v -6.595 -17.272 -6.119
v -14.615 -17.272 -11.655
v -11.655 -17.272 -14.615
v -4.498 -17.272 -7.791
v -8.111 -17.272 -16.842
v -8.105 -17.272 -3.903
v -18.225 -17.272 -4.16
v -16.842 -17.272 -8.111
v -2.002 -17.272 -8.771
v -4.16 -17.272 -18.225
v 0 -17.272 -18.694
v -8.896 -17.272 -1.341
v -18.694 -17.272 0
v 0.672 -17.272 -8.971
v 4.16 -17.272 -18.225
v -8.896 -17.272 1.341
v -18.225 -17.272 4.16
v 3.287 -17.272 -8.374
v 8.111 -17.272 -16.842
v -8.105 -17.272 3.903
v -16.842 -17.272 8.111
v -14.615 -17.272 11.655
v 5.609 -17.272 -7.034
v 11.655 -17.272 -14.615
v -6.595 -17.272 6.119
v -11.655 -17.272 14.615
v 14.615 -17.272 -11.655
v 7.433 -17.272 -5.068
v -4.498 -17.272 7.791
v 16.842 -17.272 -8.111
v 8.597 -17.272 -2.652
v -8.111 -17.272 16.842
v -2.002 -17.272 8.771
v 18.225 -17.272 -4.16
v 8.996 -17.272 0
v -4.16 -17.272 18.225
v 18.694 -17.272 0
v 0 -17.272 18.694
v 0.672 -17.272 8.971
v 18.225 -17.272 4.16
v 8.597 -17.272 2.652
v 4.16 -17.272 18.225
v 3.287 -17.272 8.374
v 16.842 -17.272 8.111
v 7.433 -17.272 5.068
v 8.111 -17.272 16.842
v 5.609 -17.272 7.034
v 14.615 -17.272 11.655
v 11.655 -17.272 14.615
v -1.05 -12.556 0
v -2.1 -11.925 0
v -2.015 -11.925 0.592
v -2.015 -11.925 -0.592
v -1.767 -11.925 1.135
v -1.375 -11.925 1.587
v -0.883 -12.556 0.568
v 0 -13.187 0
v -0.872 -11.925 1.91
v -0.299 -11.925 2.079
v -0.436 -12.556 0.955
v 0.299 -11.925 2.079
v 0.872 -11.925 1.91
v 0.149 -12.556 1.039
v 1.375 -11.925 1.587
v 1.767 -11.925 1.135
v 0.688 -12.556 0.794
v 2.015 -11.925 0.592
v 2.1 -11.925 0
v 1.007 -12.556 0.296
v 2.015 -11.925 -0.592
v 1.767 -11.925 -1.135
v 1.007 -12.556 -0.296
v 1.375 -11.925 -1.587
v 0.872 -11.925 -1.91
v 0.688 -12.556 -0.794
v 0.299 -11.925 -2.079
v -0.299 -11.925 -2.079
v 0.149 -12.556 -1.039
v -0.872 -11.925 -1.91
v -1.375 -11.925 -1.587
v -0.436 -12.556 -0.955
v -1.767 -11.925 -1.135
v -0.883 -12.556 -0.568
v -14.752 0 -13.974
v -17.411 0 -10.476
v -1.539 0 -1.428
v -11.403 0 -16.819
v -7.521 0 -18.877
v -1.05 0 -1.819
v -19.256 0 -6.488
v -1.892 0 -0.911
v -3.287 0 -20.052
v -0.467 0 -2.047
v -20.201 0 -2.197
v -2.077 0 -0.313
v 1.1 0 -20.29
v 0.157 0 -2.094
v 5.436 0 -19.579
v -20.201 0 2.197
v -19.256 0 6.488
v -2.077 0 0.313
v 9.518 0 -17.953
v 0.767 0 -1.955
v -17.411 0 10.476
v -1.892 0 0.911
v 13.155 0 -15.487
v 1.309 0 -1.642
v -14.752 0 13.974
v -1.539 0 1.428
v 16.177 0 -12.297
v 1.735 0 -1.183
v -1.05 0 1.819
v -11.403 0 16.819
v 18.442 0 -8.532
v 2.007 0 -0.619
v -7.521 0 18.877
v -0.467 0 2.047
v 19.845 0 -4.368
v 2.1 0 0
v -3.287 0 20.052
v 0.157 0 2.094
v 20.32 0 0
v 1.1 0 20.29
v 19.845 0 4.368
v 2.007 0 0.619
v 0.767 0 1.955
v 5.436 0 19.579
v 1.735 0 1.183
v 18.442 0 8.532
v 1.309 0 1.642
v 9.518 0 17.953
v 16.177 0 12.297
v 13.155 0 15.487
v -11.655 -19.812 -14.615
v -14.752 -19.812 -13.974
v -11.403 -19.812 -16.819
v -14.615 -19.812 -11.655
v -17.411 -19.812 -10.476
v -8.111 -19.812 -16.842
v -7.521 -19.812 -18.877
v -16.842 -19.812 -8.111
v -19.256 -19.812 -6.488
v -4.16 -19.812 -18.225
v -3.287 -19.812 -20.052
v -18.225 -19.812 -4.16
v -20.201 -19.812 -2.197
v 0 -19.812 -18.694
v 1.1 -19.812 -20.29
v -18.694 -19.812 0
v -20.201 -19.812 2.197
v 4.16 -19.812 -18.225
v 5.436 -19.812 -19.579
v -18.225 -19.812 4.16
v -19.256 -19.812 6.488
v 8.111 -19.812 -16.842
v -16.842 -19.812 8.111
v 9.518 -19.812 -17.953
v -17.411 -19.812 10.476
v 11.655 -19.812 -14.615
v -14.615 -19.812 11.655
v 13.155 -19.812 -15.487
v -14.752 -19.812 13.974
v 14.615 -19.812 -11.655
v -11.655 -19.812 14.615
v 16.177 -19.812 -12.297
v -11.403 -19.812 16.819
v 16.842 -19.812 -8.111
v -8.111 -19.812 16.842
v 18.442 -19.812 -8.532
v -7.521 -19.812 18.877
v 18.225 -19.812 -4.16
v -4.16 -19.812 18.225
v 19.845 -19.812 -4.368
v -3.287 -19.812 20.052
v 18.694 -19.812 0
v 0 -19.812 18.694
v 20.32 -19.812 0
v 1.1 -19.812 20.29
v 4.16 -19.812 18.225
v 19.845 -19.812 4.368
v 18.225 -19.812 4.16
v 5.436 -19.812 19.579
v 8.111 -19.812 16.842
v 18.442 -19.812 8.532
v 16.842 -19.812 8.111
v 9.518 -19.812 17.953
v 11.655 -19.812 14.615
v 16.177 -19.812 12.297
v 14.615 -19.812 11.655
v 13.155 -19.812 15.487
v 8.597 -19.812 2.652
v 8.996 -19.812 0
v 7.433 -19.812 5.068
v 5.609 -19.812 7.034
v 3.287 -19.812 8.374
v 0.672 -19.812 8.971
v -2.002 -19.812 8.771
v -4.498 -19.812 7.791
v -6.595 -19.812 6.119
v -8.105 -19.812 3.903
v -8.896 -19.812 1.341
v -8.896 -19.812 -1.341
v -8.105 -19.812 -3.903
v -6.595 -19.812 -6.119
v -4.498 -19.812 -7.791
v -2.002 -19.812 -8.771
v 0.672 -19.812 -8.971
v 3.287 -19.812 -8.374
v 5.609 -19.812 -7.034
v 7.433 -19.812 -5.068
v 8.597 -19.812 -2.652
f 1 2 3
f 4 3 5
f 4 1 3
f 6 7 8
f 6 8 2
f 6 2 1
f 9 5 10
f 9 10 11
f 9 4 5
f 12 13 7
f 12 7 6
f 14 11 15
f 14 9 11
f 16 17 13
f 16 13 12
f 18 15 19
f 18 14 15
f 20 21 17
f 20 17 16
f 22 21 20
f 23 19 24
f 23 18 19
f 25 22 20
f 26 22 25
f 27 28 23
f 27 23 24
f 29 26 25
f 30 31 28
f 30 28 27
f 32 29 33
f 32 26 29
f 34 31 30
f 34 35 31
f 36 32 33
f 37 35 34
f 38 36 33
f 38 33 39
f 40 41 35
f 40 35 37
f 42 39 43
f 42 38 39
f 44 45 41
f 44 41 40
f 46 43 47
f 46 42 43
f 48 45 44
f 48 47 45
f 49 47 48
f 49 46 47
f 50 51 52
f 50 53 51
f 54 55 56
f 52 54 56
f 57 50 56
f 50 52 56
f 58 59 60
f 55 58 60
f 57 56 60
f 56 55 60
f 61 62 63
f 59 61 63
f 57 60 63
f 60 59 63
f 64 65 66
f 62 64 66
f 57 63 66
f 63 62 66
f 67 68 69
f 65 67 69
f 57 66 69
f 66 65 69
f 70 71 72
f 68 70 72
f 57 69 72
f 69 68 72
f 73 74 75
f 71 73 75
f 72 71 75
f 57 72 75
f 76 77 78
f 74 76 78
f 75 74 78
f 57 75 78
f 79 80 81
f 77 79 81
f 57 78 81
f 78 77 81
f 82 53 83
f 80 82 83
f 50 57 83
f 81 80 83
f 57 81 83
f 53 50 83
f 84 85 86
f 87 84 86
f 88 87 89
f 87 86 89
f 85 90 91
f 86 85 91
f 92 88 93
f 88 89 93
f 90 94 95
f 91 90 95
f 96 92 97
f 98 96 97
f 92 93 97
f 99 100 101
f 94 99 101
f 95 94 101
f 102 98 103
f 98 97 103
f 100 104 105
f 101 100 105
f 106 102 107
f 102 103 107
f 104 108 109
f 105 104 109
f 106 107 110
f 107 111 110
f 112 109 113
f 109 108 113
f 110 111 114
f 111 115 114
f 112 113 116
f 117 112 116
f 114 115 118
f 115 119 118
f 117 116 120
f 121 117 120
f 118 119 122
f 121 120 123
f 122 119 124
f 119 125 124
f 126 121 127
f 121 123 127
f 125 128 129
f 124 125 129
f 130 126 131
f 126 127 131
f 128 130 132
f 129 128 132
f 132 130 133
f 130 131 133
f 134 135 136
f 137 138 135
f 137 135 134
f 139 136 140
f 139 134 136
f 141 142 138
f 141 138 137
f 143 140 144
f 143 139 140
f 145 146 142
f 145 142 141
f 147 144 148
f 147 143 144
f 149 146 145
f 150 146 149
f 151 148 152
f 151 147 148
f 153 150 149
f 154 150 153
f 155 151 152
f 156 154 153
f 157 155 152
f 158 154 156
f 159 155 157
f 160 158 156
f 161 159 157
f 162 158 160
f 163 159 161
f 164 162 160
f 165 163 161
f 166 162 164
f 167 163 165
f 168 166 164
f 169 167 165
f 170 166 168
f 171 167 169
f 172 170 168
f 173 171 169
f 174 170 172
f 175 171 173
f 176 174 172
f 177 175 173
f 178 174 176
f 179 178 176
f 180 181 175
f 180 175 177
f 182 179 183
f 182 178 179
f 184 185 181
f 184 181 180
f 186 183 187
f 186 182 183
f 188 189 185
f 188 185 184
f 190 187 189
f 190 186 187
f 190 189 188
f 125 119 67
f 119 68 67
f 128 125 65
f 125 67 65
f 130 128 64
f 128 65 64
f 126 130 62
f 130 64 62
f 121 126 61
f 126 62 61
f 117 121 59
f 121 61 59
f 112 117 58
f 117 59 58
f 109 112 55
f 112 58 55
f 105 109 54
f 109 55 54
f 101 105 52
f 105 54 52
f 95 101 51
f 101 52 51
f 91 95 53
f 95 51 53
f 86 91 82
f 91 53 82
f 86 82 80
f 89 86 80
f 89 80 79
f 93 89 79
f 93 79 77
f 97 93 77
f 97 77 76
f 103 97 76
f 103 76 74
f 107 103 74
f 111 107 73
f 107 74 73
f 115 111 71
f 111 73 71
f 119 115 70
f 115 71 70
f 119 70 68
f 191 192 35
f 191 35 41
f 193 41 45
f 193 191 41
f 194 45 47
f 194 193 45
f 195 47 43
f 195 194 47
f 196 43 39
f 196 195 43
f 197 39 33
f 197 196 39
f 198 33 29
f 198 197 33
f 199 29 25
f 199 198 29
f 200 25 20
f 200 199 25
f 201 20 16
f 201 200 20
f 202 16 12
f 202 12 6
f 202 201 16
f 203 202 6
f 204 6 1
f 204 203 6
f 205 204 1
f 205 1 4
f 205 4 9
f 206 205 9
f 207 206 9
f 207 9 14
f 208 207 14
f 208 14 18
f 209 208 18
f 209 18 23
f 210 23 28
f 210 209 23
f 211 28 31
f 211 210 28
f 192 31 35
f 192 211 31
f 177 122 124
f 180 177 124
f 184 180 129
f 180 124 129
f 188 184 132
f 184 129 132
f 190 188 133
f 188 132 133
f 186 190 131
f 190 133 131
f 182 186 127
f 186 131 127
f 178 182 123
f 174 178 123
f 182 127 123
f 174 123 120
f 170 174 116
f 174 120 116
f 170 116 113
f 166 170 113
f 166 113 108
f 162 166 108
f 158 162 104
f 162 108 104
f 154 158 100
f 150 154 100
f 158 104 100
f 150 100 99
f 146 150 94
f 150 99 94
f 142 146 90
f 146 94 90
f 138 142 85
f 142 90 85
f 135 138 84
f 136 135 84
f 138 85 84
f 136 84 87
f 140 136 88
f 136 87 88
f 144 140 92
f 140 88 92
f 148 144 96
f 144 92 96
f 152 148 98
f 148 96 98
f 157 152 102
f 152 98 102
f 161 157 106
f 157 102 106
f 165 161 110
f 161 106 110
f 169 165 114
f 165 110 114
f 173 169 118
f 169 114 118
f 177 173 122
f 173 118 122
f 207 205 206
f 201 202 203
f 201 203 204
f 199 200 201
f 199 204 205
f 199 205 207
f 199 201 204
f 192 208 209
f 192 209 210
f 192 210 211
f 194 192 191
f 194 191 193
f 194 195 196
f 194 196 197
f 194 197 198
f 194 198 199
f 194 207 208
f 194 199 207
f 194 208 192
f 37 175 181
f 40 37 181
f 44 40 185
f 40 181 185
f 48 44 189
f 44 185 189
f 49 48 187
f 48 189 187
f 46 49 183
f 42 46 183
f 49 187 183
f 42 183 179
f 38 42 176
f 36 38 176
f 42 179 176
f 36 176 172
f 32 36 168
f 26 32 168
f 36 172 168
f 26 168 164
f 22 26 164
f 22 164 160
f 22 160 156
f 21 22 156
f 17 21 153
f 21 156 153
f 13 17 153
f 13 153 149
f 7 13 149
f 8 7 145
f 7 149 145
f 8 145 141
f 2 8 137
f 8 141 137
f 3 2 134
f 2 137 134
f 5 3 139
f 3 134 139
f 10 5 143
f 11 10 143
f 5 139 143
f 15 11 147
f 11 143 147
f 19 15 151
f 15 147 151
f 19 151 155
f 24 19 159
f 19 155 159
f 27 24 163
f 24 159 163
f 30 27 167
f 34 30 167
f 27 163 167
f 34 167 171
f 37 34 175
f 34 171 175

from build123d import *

# Parameters (mm, degrees)
F0_R     = 20.32
F1_DEPTH = 19.812
F2_R     = 18.6937497488
F2_R_2   = 8.9962892538
F3_DEPTH = 2.54
F5_D     = 4.2
F5_DEPTH = 11.925
F5_TIP   = 1.2618073


with BuildPart() as f1:
    # F0 (on Front) → F1 (new body)
    with BuildSketch(Plane.XZ):
        Circle(F0_R)
    extrude(amount=F1_DEPTH)

    # F2 (on face) → F3 (cut)
    with BuildSketch(Plane.XZ.offset(19.812)):
        Circle(F2_R)
        Circle(F2_R_2, mode=Mode.SUBTRACT)
    extrude(amount=-F3_DEPTH, mode=Mode.SUBTRACT)

    # F5
    with Locations(Plane(origin=(0, 0, 0), x_dir=(-1, 0, 0), z_dir=(0, 1, 0))):
        with Locations((0, 0)):
            Hole(F5_D / 2, depth=F5_DEPTH)
            with Locations((0, 0, -(F5_DEPTH + F5_TIP / 2))):  # 118° drill point
                Cone(0, F5_D / 2, F5_TIP, mode=Mode.SUBTRACT)


solid = f1.part
